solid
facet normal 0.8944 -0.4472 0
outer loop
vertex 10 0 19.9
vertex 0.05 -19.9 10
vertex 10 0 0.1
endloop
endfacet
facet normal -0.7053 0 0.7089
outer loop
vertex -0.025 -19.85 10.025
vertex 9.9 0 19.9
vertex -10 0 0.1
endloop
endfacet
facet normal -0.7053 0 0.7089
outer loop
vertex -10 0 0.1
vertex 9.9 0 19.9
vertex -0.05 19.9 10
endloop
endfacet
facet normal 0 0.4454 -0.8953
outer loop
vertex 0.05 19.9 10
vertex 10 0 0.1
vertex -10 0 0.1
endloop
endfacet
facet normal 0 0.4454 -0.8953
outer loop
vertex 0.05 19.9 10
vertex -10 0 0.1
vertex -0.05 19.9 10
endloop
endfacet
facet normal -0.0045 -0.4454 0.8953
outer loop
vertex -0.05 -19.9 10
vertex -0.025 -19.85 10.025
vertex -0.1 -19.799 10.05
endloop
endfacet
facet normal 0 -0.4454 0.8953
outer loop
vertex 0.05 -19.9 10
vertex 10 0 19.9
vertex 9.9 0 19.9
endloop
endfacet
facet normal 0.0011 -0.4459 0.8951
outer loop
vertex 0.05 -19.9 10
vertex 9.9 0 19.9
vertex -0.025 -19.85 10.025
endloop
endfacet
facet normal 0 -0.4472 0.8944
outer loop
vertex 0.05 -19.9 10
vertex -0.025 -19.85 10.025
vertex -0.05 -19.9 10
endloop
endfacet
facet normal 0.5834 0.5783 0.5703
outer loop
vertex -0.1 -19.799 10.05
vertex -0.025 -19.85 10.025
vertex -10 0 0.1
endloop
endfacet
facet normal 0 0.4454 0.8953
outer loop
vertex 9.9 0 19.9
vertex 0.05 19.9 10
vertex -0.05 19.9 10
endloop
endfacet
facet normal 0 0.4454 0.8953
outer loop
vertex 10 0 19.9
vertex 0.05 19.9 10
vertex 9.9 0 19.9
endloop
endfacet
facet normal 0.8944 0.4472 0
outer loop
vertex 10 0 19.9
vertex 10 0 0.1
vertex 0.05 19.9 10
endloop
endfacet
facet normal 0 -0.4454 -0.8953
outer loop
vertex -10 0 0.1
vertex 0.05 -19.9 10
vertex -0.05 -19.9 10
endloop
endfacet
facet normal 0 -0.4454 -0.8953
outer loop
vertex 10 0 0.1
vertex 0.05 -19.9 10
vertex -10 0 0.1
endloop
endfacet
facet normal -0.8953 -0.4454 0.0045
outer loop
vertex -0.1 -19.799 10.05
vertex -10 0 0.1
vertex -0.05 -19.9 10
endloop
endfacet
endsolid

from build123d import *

# Parameters (mm, degrees)
DODANIE_WYCI_GNI_CIE1_DEPTH     = 20
WYTNIJ_WYCI_GNI_CIE2_DEPTH      = 10
WYTNIJ_WYCI_GNI_CIE2_DEPTH_BACK = 10
WYTNIJ_WYCI_GNI_CIE3_DEPTH      = 40


with BuildPart() as part:
    # Szkic2 → Dodanie-wyciągnięcie1 (new body)
    with BuildSketch(Plane.XY):
        Polygon((10, 0), (0, 20), (-10, 0), (0, -20), align=None)
    extrude(amount=DODANIE_WYCI_GNI_CIE1_DEPTH)

    # Szkic6 → Wytnij-wyciągnięcie2 (cut, two sides: drawn at the far end of the back side and taken through both)
    with BuildSketch(Plane(origin=(0, 0, 0), x_dir=(0, 0, -1), z_dir=(1, 0, 0)).offset(-WYTNIJ_WYCI_GNI_CIE2_DEPTH_BACK)):
        Polygon((-20, 0), (-20, 20), (0, 20), (0, -20), (-20, -20), align=None)
        Polygon((-10, 19.9), (-19.9, 0), (-10, -19.9), (-0.1, 0), align=None, mode=Mode.SUBTRACT)
    extrude(amount=WYTNIJ_WYCI_GNI_CIE2_DEPTH + WYTNIJ_WYCI_GNI_CIE2_DEPTH_BACK, mode=Mode.SUBTRACT)

    # Szkic7 → Wytnij-wyciągnięcie3 (cut)
    with BuildSketch(Plane(origin=(-5.024810608, 0, 5.05018844), x_dir=(-0.708885657709236, 0, -0.7053234182232602), z_dir=(0.7053234182232602, 0, -0.708885657709236))):
        Polygon((7.018324235, 0), (-7.017789899, 19.9), (-21.1247926, 0), (-7.088678465, -19.9), align=None)
    extrude(amount=-WYTNIJ_WYCI_GNI_CIE3_DEPTH, mode=Mode.SUBTRACT)


solid = part.part
